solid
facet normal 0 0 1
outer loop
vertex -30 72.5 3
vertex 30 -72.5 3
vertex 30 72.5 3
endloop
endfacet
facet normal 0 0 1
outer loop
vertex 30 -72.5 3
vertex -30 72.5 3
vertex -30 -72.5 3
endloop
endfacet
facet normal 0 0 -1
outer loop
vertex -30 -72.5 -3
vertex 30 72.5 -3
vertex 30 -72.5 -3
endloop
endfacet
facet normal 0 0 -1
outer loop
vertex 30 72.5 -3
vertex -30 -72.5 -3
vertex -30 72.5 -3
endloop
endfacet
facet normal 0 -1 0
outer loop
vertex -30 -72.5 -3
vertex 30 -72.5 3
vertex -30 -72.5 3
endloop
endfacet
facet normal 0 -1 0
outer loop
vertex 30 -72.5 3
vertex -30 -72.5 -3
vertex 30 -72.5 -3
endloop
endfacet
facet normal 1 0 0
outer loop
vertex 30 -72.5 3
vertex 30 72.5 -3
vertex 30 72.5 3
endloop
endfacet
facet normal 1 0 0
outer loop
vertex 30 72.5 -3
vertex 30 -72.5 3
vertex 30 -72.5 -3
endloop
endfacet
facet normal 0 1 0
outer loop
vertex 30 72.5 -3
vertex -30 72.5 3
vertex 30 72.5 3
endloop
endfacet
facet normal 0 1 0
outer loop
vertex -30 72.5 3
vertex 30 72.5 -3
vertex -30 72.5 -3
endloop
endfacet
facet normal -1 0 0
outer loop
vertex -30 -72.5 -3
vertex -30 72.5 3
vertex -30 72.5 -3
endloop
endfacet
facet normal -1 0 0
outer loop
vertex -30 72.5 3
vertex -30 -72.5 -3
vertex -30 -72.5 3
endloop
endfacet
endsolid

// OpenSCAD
echo("Работа Пермякова Максима");
len_phone = 145;
width_phone = 60;
thickness_phone = 6;

corner_round = 9;

cube([width_phone, len_phone, thickness_phone], center=true);

module smartphone() {
hull() {
    color("red")
    translate([width_phone/2, len_phone/2, 0])
    cylinder(h=thickness_phone, d=corner_round, $fn=32, center=true);

    mirror([1,0,0])
    color("red")
    translate([width_phone/2, len_phone/2, 0])
    cylinder(h=thickness_phone, d=corner_round, $fn=32, center=true);

    mirror([0,1,0])
    color("red")
    translate([width_phone/2, len_phone/2, 0])
    cylinder(h=thickness_phone, d=corner_round, $fn=32, center=true);

    mirror([1,0,0])
    mirror([0,1,0])
    color("red")
    translate([width_phone/2, len_phone/2, 0])
    cylinder(h=thickness_phone, d=corner_round, $fn=32, center=true);
}

corner_round = 4;

hull() {
    color("red")
    translate([width_phone/2-corner_round/2, len_phone/2-corner_round/2, 0])
    cylinder(h=15, d=corner_round, $fn=32, center=true);

    mirror([1,0,0])
    color("red")
    translate([width_phone/2-corner_round/2, len_phone/2-corner_round/2, 0])
    cylinder(h=15, d=corner_round, $fn=32, center=true);

    mirror([0,1,0])
    color("red")
    translate([width_phone/2-corner_round/2, len_phone/2-corner_round/2, 0])
    cylinder(h=15, d=corner_round, $fn=32, center=true);

    mirror([1,0,0])
    mirror([0,1,0])
    color("red")
    translate([width_phone/2-corner_round/2, len_phone/2-corner_round/2, 0])
    cylinder(h=15, d=corner_round, $fn=32, center=true);
}
}
